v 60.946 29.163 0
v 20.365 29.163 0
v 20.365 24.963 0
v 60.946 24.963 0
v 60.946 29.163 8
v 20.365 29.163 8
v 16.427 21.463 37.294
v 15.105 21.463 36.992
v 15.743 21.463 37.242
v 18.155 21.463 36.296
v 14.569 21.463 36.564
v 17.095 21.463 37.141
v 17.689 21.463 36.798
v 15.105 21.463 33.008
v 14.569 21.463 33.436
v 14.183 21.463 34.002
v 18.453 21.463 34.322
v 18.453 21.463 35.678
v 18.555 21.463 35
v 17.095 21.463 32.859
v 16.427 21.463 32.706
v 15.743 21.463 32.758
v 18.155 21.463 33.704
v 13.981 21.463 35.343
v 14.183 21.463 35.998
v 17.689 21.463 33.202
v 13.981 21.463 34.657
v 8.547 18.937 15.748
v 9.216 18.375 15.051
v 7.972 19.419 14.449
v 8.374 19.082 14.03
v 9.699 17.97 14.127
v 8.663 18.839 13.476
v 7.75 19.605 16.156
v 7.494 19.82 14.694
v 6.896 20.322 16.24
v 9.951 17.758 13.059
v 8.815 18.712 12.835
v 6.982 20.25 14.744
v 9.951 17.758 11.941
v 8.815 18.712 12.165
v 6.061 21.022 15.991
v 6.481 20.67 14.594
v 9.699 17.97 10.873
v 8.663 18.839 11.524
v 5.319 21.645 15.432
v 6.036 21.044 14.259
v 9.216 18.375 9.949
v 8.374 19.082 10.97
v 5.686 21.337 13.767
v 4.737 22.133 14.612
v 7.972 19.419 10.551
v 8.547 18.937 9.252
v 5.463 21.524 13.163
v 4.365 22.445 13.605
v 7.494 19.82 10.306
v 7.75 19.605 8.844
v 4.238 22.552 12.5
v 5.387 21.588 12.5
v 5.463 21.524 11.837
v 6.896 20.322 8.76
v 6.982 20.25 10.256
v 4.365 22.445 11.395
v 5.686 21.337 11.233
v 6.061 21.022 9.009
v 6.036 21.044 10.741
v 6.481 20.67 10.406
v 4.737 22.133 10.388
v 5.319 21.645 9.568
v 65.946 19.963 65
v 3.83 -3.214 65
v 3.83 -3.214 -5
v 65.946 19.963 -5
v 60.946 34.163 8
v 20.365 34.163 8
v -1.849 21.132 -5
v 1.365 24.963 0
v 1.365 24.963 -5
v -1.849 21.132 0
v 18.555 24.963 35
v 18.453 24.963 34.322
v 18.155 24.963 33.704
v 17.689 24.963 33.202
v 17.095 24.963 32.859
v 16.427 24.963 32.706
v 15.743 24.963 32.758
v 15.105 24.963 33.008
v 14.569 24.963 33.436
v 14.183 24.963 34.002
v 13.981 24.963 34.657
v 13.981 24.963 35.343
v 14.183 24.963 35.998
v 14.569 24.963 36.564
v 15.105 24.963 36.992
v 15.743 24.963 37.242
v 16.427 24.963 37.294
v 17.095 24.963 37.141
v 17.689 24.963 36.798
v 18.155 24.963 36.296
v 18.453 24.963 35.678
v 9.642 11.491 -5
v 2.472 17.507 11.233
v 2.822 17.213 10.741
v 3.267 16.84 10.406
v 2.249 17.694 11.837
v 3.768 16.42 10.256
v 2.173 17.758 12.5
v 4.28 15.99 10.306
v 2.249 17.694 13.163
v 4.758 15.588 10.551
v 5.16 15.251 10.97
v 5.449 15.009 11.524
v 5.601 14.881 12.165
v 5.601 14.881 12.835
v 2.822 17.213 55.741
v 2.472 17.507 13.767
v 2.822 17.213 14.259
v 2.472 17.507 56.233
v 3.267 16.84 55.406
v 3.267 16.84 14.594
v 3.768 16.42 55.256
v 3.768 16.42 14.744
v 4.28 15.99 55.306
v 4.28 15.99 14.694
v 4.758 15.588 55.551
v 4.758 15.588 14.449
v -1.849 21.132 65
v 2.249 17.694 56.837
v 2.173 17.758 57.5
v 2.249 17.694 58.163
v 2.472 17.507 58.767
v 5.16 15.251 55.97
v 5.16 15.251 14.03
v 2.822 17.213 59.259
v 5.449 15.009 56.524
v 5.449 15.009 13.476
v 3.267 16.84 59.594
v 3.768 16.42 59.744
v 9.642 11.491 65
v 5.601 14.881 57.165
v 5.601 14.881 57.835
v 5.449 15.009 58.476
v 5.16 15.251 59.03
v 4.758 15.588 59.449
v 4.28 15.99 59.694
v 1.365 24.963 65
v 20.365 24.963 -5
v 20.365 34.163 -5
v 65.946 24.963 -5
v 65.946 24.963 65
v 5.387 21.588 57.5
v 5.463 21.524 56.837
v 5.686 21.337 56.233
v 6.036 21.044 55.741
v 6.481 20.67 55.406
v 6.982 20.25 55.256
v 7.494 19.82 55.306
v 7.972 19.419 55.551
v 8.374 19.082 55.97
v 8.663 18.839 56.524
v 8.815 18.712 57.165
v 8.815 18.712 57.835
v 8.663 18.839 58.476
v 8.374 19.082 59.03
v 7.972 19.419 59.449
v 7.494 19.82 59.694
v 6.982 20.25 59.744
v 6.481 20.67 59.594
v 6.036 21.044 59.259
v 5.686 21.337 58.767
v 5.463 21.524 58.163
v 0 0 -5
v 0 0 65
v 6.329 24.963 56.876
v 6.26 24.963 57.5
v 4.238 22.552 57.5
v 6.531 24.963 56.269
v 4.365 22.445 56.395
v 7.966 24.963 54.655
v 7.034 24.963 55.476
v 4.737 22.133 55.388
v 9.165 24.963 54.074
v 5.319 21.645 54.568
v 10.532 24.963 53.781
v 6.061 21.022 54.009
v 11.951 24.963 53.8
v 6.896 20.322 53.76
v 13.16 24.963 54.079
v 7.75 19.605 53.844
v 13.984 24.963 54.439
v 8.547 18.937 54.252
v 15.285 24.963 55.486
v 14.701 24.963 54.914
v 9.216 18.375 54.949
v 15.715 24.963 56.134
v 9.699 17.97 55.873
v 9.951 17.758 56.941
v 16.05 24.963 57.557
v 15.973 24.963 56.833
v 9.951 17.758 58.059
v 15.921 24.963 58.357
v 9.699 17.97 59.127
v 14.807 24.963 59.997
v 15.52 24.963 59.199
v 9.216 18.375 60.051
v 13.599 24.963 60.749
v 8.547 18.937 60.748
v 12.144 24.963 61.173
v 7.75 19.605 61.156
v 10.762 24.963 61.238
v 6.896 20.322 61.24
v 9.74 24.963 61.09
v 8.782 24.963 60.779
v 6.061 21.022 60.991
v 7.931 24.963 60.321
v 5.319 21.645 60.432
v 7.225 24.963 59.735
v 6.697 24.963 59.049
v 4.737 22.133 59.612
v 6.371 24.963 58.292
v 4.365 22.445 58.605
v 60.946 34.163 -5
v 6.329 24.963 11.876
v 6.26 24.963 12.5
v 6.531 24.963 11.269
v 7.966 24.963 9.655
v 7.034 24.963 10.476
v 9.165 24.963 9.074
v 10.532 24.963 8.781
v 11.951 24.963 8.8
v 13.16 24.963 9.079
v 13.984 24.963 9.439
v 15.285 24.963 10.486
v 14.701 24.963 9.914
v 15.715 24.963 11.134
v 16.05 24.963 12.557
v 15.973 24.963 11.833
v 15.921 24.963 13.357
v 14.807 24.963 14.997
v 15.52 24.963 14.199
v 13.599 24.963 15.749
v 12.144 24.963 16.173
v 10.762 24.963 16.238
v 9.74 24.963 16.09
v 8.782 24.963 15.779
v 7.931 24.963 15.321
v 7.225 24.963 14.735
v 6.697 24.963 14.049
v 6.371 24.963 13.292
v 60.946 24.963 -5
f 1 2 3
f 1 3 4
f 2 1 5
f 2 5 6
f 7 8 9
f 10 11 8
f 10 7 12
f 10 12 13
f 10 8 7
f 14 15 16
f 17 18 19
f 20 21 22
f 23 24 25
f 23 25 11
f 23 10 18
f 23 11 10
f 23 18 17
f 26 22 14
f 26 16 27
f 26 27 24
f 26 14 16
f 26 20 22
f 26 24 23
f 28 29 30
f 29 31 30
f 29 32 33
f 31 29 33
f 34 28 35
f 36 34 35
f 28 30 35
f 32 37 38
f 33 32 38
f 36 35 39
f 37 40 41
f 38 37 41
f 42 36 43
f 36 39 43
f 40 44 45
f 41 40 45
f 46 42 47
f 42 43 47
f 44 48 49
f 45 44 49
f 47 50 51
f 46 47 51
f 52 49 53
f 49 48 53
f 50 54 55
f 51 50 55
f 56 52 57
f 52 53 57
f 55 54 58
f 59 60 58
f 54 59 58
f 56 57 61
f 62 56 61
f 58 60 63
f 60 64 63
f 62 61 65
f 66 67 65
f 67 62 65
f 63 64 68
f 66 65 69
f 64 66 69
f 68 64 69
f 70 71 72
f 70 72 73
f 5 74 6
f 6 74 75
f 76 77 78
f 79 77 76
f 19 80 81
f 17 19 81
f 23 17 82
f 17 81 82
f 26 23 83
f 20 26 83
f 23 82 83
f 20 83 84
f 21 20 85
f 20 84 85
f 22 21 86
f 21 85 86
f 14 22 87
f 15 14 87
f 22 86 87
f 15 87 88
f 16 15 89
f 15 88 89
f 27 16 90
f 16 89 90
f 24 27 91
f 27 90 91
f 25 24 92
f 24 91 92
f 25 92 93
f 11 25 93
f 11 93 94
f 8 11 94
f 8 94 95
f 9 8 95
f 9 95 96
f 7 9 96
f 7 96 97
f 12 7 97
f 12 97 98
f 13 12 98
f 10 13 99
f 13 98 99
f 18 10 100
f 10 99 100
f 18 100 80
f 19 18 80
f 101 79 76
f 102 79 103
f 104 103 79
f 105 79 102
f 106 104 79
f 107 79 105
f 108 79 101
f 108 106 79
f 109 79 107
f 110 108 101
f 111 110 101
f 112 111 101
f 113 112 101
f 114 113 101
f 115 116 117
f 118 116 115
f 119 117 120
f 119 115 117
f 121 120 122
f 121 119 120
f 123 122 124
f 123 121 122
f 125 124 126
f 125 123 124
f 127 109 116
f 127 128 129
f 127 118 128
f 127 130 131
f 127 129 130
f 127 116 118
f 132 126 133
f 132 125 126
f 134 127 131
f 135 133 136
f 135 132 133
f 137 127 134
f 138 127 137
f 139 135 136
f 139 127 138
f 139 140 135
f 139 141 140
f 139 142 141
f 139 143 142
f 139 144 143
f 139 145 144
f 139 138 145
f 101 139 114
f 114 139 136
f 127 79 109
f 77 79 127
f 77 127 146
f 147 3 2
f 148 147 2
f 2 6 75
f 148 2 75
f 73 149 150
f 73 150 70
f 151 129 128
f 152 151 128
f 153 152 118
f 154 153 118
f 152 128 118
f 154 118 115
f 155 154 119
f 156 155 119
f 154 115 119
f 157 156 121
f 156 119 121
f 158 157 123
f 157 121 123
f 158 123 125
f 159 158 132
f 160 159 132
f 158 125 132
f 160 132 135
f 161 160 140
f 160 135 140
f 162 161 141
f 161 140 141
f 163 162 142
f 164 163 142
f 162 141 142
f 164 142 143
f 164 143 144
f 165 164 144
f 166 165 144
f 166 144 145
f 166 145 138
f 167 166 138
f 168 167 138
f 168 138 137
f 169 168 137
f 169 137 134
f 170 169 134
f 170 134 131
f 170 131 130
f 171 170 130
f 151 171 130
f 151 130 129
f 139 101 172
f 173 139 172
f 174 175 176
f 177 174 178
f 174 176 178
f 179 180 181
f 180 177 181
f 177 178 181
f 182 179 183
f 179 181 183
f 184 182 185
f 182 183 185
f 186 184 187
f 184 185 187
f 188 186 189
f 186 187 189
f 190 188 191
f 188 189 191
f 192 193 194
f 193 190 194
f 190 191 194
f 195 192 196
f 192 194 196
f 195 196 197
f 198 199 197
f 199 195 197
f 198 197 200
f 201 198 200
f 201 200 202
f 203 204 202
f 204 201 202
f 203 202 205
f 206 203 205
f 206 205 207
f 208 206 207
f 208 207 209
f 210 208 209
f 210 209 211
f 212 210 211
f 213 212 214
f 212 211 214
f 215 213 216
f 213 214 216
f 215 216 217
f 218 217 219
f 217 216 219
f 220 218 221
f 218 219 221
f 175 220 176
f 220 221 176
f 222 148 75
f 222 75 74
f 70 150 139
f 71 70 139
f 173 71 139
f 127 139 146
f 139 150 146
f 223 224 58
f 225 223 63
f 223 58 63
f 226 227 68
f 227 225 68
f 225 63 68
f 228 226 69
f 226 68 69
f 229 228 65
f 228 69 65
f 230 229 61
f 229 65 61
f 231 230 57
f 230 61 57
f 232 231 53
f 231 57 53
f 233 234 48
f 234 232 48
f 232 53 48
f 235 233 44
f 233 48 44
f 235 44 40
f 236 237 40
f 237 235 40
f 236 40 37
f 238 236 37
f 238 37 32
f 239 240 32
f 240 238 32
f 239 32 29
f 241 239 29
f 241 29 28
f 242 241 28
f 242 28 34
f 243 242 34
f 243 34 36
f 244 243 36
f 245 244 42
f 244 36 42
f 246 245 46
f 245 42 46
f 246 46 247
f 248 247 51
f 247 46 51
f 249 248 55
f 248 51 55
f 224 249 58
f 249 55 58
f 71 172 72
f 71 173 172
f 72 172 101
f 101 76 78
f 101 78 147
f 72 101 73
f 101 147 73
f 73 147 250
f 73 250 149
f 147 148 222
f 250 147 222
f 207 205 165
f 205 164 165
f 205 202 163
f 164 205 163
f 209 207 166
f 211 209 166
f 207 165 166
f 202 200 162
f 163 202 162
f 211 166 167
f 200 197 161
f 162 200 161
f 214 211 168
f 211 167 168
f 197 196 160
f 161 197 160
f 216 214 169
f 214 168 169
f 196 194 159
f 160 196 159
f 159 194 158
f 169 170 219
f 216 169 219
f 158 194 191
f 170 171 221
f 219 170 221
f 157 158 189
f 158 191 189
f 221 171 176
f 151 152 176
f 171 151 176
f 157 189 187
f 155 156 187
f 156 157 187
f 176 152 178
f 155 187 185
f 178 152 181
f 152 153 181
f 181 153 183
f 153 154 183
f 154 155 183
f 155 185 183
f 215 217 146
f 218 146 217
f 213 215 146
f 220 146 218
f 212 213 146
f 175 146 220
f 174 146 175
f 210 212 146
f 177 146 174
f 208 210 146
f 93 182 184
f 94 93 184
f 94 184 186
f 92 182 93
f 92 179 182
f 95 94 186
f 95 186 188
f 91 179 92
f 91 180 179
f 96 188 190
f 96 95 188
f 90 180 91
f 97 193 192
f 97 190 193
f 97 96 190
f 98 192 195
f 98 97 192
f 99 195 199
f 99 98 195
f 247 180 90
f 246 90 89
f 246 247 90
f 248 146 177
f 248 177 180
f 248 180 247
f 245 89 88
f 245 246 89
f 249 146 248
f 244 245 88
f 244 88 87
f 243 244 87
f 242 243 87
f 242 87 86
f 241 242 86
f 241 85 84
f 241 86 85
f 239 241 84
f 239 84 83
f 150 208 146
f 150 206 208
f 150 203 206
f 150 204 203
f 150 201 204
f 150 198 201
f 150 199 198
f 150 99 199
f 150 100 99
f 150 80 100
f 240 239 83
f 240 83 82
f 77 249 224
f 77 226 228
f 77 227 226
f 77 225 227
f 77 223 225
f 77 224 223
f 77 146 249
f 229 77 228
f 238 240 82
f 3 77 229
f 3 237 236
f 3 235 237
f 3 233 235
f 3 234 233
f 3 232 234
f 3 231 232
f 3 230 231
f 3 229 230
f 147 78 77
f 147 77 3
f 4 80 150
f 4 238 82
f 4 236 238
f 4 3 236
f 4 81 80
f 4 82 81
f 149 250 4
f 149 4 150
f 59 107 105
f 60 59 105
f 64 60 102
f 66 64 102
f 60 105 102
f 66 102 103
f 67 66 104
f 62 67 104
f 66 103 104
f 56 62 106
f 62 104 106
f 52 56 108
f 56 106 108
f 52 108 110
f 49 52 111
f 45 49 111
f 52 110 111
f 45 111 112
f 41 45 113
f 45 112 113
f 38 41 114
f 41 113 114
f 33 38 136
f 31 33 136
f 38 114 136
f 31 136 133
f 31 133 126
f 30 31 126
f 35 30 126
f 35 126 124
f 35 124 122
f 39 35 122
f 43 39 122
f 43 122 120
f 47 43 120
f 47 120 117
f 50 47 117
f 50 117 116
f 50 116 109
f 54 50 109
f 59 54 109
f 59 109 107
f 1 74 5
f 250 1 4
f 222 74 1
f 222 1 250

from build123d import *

# Parameters (mm, degrees)
EXTRUDE_1_DEPTH     = 65
SKETCH_4_R          = 2.25
CUT_EXTRUDE_2_DEPTH = 44
CUT_EXTRUDE_START   = -5
SKETCH_5_R          = 3.75
CUT_EXTRUDE_3_DEPTH = 44
EXTRUDE_2_DEPTH     = 5
EXTRUDE_4_DEPTH     = 8
SKETCH_9_R          = 2.3
CUT_EXTRUDE_4_DEPTH = 3.5
CUT_EXTRUDE_6_DEPTH = 14
CUT_EXTRUDE_7_DEPTH = 5


with BuildPart() as part:
    # ｽｹｯﾁ1 → ﾎﾞｽ - 押し出し1 (new body)
    with BuildSketch(Plane.XY):
        Polygon((0, 0), (9.641814145, 11.490666647), (-1.848852501, 21.132480792), (1.365085547, 24.962703008), (65.946194887, 24.962703008), (65.946194887, 19.962703008), (3.830222216, -3.213938048), align=None)
    extrude(amount=EXTRUDE_1_DEPTH)

    # ｽｹｯﾁ4 → ｶｯﾄ - 押し出し2 (cut)
    with BuildSketch(Plane(origin=(9.641814145, 11.490666647, 0), x_dir=(-0.766044443, 0.64278761, 0), z_dir=(-0.64278761, -0.766044443, 0))):
        with Locations((7.5, -12.5)):
            Circle(SKETCH_4_R)
        with Locations((7.5, -57.5)):
            Circle(SKETCH_4_R)
    extrude(amount=-CUT_EXTRUDE_2_DEPTH, mode=Mode.SUBTRACT)

    # ｽｹｯﾁ5 → ｶｯﾄ - 押し出し3 (cut)
    with BuildSketch(Plane(origin=(9.641814145, 11.490666647, 0), x_dir=(-0.766044443, 0.64278761, 0), z_dir=(-0.64278761, -0.766044443, 0)).offset(CUT_EXTRUDE_START)):
        with Locations((7.5, -57.5)):
            Circle(SKETCH_5_R)
        with Locations((7.5, -12.5)):
            Circle(SKETCH_5_R)
    extrude(amount=-CUT_EXTRUDE_3_DEPTH, mode=Mode.SUBTRACT)

    # ｽｹｯﾁ6 → ﾎﾞｽ - 押し出し2 (add)
    with BuildSketch(Plane.XY):
        Polygon((0, 0), (3.830222216, -3.213938048), (65.946194887, 19.962703008), (65.946194887, 34.162703008), (9.084802154, 34.162703008), (-1.848852501, 21.132480792), (9.641814145, 11.490666647), align=None)
    extrude(amount=-EXTRUDE_2_DEPTH)

    # ｽｹｯﾁ8 → ﾎﾞｽ - 押し出し4 (add)
    with BuildSketch(Plane.XY):
        Polygon((65.946194887, 34.162703008), (65.946194887, 29.162703008), (4.889303998, 29.162703008), (9.084802154, 34.162703008), align=None)
    extrude(amount=EXTRUDE_4_DEPTH)

    # ｽｹｯﾁ9 → ｶｯﾄ - 押し出し4 (cut)
    with BuildSketch(Plane(origin=(0, 24.962703008, 0), x_dir=(1, 0, 0), z_dir=(0, 1, 0))):
        with Locations((16.255085547, -35)):
            Circle(SKETCH_9_R)
    extrude(amount=-CUT_EXTRUDE_4_DEPTH, mode=Mode.SUBTRACT)

    # ｽｹｯﾁ11 → ｶｯﾄ - 押し出し6 (cut, through all)
    with BuildSketch(Plane.XY.offset(8)):
        Polygon((1.365085547, 24.962703008), (20.364802154, 24.962703008), (20.364802154, 34.162703008), (9.084802154, 34.162703008), align=None)
    extrude(amount=-CUT_EXTRUDE_6_DEPTH, mode=Mode.SUBTRACT)

    # ｽｹｯﾁ12 → ｶｯﾄ - 押し出し7 (cut)
    with BuildSketch(Plane(origin=(65.946194887, 0, 0), x_dir=(0, 0, -1), z_dir=(1, 0, 0))):
        Polygon((0, 24.962703008), (5, 24.962703008), (5, 34.162703008), (-8, 34.162703008), (-8, 29.162703008), (0, 29.162703008), align=None)
    extrude(amount=-CUT_EXTRUDE_7_DEPTH, mode=Mode.SUBTRACT)


solid = part.part
